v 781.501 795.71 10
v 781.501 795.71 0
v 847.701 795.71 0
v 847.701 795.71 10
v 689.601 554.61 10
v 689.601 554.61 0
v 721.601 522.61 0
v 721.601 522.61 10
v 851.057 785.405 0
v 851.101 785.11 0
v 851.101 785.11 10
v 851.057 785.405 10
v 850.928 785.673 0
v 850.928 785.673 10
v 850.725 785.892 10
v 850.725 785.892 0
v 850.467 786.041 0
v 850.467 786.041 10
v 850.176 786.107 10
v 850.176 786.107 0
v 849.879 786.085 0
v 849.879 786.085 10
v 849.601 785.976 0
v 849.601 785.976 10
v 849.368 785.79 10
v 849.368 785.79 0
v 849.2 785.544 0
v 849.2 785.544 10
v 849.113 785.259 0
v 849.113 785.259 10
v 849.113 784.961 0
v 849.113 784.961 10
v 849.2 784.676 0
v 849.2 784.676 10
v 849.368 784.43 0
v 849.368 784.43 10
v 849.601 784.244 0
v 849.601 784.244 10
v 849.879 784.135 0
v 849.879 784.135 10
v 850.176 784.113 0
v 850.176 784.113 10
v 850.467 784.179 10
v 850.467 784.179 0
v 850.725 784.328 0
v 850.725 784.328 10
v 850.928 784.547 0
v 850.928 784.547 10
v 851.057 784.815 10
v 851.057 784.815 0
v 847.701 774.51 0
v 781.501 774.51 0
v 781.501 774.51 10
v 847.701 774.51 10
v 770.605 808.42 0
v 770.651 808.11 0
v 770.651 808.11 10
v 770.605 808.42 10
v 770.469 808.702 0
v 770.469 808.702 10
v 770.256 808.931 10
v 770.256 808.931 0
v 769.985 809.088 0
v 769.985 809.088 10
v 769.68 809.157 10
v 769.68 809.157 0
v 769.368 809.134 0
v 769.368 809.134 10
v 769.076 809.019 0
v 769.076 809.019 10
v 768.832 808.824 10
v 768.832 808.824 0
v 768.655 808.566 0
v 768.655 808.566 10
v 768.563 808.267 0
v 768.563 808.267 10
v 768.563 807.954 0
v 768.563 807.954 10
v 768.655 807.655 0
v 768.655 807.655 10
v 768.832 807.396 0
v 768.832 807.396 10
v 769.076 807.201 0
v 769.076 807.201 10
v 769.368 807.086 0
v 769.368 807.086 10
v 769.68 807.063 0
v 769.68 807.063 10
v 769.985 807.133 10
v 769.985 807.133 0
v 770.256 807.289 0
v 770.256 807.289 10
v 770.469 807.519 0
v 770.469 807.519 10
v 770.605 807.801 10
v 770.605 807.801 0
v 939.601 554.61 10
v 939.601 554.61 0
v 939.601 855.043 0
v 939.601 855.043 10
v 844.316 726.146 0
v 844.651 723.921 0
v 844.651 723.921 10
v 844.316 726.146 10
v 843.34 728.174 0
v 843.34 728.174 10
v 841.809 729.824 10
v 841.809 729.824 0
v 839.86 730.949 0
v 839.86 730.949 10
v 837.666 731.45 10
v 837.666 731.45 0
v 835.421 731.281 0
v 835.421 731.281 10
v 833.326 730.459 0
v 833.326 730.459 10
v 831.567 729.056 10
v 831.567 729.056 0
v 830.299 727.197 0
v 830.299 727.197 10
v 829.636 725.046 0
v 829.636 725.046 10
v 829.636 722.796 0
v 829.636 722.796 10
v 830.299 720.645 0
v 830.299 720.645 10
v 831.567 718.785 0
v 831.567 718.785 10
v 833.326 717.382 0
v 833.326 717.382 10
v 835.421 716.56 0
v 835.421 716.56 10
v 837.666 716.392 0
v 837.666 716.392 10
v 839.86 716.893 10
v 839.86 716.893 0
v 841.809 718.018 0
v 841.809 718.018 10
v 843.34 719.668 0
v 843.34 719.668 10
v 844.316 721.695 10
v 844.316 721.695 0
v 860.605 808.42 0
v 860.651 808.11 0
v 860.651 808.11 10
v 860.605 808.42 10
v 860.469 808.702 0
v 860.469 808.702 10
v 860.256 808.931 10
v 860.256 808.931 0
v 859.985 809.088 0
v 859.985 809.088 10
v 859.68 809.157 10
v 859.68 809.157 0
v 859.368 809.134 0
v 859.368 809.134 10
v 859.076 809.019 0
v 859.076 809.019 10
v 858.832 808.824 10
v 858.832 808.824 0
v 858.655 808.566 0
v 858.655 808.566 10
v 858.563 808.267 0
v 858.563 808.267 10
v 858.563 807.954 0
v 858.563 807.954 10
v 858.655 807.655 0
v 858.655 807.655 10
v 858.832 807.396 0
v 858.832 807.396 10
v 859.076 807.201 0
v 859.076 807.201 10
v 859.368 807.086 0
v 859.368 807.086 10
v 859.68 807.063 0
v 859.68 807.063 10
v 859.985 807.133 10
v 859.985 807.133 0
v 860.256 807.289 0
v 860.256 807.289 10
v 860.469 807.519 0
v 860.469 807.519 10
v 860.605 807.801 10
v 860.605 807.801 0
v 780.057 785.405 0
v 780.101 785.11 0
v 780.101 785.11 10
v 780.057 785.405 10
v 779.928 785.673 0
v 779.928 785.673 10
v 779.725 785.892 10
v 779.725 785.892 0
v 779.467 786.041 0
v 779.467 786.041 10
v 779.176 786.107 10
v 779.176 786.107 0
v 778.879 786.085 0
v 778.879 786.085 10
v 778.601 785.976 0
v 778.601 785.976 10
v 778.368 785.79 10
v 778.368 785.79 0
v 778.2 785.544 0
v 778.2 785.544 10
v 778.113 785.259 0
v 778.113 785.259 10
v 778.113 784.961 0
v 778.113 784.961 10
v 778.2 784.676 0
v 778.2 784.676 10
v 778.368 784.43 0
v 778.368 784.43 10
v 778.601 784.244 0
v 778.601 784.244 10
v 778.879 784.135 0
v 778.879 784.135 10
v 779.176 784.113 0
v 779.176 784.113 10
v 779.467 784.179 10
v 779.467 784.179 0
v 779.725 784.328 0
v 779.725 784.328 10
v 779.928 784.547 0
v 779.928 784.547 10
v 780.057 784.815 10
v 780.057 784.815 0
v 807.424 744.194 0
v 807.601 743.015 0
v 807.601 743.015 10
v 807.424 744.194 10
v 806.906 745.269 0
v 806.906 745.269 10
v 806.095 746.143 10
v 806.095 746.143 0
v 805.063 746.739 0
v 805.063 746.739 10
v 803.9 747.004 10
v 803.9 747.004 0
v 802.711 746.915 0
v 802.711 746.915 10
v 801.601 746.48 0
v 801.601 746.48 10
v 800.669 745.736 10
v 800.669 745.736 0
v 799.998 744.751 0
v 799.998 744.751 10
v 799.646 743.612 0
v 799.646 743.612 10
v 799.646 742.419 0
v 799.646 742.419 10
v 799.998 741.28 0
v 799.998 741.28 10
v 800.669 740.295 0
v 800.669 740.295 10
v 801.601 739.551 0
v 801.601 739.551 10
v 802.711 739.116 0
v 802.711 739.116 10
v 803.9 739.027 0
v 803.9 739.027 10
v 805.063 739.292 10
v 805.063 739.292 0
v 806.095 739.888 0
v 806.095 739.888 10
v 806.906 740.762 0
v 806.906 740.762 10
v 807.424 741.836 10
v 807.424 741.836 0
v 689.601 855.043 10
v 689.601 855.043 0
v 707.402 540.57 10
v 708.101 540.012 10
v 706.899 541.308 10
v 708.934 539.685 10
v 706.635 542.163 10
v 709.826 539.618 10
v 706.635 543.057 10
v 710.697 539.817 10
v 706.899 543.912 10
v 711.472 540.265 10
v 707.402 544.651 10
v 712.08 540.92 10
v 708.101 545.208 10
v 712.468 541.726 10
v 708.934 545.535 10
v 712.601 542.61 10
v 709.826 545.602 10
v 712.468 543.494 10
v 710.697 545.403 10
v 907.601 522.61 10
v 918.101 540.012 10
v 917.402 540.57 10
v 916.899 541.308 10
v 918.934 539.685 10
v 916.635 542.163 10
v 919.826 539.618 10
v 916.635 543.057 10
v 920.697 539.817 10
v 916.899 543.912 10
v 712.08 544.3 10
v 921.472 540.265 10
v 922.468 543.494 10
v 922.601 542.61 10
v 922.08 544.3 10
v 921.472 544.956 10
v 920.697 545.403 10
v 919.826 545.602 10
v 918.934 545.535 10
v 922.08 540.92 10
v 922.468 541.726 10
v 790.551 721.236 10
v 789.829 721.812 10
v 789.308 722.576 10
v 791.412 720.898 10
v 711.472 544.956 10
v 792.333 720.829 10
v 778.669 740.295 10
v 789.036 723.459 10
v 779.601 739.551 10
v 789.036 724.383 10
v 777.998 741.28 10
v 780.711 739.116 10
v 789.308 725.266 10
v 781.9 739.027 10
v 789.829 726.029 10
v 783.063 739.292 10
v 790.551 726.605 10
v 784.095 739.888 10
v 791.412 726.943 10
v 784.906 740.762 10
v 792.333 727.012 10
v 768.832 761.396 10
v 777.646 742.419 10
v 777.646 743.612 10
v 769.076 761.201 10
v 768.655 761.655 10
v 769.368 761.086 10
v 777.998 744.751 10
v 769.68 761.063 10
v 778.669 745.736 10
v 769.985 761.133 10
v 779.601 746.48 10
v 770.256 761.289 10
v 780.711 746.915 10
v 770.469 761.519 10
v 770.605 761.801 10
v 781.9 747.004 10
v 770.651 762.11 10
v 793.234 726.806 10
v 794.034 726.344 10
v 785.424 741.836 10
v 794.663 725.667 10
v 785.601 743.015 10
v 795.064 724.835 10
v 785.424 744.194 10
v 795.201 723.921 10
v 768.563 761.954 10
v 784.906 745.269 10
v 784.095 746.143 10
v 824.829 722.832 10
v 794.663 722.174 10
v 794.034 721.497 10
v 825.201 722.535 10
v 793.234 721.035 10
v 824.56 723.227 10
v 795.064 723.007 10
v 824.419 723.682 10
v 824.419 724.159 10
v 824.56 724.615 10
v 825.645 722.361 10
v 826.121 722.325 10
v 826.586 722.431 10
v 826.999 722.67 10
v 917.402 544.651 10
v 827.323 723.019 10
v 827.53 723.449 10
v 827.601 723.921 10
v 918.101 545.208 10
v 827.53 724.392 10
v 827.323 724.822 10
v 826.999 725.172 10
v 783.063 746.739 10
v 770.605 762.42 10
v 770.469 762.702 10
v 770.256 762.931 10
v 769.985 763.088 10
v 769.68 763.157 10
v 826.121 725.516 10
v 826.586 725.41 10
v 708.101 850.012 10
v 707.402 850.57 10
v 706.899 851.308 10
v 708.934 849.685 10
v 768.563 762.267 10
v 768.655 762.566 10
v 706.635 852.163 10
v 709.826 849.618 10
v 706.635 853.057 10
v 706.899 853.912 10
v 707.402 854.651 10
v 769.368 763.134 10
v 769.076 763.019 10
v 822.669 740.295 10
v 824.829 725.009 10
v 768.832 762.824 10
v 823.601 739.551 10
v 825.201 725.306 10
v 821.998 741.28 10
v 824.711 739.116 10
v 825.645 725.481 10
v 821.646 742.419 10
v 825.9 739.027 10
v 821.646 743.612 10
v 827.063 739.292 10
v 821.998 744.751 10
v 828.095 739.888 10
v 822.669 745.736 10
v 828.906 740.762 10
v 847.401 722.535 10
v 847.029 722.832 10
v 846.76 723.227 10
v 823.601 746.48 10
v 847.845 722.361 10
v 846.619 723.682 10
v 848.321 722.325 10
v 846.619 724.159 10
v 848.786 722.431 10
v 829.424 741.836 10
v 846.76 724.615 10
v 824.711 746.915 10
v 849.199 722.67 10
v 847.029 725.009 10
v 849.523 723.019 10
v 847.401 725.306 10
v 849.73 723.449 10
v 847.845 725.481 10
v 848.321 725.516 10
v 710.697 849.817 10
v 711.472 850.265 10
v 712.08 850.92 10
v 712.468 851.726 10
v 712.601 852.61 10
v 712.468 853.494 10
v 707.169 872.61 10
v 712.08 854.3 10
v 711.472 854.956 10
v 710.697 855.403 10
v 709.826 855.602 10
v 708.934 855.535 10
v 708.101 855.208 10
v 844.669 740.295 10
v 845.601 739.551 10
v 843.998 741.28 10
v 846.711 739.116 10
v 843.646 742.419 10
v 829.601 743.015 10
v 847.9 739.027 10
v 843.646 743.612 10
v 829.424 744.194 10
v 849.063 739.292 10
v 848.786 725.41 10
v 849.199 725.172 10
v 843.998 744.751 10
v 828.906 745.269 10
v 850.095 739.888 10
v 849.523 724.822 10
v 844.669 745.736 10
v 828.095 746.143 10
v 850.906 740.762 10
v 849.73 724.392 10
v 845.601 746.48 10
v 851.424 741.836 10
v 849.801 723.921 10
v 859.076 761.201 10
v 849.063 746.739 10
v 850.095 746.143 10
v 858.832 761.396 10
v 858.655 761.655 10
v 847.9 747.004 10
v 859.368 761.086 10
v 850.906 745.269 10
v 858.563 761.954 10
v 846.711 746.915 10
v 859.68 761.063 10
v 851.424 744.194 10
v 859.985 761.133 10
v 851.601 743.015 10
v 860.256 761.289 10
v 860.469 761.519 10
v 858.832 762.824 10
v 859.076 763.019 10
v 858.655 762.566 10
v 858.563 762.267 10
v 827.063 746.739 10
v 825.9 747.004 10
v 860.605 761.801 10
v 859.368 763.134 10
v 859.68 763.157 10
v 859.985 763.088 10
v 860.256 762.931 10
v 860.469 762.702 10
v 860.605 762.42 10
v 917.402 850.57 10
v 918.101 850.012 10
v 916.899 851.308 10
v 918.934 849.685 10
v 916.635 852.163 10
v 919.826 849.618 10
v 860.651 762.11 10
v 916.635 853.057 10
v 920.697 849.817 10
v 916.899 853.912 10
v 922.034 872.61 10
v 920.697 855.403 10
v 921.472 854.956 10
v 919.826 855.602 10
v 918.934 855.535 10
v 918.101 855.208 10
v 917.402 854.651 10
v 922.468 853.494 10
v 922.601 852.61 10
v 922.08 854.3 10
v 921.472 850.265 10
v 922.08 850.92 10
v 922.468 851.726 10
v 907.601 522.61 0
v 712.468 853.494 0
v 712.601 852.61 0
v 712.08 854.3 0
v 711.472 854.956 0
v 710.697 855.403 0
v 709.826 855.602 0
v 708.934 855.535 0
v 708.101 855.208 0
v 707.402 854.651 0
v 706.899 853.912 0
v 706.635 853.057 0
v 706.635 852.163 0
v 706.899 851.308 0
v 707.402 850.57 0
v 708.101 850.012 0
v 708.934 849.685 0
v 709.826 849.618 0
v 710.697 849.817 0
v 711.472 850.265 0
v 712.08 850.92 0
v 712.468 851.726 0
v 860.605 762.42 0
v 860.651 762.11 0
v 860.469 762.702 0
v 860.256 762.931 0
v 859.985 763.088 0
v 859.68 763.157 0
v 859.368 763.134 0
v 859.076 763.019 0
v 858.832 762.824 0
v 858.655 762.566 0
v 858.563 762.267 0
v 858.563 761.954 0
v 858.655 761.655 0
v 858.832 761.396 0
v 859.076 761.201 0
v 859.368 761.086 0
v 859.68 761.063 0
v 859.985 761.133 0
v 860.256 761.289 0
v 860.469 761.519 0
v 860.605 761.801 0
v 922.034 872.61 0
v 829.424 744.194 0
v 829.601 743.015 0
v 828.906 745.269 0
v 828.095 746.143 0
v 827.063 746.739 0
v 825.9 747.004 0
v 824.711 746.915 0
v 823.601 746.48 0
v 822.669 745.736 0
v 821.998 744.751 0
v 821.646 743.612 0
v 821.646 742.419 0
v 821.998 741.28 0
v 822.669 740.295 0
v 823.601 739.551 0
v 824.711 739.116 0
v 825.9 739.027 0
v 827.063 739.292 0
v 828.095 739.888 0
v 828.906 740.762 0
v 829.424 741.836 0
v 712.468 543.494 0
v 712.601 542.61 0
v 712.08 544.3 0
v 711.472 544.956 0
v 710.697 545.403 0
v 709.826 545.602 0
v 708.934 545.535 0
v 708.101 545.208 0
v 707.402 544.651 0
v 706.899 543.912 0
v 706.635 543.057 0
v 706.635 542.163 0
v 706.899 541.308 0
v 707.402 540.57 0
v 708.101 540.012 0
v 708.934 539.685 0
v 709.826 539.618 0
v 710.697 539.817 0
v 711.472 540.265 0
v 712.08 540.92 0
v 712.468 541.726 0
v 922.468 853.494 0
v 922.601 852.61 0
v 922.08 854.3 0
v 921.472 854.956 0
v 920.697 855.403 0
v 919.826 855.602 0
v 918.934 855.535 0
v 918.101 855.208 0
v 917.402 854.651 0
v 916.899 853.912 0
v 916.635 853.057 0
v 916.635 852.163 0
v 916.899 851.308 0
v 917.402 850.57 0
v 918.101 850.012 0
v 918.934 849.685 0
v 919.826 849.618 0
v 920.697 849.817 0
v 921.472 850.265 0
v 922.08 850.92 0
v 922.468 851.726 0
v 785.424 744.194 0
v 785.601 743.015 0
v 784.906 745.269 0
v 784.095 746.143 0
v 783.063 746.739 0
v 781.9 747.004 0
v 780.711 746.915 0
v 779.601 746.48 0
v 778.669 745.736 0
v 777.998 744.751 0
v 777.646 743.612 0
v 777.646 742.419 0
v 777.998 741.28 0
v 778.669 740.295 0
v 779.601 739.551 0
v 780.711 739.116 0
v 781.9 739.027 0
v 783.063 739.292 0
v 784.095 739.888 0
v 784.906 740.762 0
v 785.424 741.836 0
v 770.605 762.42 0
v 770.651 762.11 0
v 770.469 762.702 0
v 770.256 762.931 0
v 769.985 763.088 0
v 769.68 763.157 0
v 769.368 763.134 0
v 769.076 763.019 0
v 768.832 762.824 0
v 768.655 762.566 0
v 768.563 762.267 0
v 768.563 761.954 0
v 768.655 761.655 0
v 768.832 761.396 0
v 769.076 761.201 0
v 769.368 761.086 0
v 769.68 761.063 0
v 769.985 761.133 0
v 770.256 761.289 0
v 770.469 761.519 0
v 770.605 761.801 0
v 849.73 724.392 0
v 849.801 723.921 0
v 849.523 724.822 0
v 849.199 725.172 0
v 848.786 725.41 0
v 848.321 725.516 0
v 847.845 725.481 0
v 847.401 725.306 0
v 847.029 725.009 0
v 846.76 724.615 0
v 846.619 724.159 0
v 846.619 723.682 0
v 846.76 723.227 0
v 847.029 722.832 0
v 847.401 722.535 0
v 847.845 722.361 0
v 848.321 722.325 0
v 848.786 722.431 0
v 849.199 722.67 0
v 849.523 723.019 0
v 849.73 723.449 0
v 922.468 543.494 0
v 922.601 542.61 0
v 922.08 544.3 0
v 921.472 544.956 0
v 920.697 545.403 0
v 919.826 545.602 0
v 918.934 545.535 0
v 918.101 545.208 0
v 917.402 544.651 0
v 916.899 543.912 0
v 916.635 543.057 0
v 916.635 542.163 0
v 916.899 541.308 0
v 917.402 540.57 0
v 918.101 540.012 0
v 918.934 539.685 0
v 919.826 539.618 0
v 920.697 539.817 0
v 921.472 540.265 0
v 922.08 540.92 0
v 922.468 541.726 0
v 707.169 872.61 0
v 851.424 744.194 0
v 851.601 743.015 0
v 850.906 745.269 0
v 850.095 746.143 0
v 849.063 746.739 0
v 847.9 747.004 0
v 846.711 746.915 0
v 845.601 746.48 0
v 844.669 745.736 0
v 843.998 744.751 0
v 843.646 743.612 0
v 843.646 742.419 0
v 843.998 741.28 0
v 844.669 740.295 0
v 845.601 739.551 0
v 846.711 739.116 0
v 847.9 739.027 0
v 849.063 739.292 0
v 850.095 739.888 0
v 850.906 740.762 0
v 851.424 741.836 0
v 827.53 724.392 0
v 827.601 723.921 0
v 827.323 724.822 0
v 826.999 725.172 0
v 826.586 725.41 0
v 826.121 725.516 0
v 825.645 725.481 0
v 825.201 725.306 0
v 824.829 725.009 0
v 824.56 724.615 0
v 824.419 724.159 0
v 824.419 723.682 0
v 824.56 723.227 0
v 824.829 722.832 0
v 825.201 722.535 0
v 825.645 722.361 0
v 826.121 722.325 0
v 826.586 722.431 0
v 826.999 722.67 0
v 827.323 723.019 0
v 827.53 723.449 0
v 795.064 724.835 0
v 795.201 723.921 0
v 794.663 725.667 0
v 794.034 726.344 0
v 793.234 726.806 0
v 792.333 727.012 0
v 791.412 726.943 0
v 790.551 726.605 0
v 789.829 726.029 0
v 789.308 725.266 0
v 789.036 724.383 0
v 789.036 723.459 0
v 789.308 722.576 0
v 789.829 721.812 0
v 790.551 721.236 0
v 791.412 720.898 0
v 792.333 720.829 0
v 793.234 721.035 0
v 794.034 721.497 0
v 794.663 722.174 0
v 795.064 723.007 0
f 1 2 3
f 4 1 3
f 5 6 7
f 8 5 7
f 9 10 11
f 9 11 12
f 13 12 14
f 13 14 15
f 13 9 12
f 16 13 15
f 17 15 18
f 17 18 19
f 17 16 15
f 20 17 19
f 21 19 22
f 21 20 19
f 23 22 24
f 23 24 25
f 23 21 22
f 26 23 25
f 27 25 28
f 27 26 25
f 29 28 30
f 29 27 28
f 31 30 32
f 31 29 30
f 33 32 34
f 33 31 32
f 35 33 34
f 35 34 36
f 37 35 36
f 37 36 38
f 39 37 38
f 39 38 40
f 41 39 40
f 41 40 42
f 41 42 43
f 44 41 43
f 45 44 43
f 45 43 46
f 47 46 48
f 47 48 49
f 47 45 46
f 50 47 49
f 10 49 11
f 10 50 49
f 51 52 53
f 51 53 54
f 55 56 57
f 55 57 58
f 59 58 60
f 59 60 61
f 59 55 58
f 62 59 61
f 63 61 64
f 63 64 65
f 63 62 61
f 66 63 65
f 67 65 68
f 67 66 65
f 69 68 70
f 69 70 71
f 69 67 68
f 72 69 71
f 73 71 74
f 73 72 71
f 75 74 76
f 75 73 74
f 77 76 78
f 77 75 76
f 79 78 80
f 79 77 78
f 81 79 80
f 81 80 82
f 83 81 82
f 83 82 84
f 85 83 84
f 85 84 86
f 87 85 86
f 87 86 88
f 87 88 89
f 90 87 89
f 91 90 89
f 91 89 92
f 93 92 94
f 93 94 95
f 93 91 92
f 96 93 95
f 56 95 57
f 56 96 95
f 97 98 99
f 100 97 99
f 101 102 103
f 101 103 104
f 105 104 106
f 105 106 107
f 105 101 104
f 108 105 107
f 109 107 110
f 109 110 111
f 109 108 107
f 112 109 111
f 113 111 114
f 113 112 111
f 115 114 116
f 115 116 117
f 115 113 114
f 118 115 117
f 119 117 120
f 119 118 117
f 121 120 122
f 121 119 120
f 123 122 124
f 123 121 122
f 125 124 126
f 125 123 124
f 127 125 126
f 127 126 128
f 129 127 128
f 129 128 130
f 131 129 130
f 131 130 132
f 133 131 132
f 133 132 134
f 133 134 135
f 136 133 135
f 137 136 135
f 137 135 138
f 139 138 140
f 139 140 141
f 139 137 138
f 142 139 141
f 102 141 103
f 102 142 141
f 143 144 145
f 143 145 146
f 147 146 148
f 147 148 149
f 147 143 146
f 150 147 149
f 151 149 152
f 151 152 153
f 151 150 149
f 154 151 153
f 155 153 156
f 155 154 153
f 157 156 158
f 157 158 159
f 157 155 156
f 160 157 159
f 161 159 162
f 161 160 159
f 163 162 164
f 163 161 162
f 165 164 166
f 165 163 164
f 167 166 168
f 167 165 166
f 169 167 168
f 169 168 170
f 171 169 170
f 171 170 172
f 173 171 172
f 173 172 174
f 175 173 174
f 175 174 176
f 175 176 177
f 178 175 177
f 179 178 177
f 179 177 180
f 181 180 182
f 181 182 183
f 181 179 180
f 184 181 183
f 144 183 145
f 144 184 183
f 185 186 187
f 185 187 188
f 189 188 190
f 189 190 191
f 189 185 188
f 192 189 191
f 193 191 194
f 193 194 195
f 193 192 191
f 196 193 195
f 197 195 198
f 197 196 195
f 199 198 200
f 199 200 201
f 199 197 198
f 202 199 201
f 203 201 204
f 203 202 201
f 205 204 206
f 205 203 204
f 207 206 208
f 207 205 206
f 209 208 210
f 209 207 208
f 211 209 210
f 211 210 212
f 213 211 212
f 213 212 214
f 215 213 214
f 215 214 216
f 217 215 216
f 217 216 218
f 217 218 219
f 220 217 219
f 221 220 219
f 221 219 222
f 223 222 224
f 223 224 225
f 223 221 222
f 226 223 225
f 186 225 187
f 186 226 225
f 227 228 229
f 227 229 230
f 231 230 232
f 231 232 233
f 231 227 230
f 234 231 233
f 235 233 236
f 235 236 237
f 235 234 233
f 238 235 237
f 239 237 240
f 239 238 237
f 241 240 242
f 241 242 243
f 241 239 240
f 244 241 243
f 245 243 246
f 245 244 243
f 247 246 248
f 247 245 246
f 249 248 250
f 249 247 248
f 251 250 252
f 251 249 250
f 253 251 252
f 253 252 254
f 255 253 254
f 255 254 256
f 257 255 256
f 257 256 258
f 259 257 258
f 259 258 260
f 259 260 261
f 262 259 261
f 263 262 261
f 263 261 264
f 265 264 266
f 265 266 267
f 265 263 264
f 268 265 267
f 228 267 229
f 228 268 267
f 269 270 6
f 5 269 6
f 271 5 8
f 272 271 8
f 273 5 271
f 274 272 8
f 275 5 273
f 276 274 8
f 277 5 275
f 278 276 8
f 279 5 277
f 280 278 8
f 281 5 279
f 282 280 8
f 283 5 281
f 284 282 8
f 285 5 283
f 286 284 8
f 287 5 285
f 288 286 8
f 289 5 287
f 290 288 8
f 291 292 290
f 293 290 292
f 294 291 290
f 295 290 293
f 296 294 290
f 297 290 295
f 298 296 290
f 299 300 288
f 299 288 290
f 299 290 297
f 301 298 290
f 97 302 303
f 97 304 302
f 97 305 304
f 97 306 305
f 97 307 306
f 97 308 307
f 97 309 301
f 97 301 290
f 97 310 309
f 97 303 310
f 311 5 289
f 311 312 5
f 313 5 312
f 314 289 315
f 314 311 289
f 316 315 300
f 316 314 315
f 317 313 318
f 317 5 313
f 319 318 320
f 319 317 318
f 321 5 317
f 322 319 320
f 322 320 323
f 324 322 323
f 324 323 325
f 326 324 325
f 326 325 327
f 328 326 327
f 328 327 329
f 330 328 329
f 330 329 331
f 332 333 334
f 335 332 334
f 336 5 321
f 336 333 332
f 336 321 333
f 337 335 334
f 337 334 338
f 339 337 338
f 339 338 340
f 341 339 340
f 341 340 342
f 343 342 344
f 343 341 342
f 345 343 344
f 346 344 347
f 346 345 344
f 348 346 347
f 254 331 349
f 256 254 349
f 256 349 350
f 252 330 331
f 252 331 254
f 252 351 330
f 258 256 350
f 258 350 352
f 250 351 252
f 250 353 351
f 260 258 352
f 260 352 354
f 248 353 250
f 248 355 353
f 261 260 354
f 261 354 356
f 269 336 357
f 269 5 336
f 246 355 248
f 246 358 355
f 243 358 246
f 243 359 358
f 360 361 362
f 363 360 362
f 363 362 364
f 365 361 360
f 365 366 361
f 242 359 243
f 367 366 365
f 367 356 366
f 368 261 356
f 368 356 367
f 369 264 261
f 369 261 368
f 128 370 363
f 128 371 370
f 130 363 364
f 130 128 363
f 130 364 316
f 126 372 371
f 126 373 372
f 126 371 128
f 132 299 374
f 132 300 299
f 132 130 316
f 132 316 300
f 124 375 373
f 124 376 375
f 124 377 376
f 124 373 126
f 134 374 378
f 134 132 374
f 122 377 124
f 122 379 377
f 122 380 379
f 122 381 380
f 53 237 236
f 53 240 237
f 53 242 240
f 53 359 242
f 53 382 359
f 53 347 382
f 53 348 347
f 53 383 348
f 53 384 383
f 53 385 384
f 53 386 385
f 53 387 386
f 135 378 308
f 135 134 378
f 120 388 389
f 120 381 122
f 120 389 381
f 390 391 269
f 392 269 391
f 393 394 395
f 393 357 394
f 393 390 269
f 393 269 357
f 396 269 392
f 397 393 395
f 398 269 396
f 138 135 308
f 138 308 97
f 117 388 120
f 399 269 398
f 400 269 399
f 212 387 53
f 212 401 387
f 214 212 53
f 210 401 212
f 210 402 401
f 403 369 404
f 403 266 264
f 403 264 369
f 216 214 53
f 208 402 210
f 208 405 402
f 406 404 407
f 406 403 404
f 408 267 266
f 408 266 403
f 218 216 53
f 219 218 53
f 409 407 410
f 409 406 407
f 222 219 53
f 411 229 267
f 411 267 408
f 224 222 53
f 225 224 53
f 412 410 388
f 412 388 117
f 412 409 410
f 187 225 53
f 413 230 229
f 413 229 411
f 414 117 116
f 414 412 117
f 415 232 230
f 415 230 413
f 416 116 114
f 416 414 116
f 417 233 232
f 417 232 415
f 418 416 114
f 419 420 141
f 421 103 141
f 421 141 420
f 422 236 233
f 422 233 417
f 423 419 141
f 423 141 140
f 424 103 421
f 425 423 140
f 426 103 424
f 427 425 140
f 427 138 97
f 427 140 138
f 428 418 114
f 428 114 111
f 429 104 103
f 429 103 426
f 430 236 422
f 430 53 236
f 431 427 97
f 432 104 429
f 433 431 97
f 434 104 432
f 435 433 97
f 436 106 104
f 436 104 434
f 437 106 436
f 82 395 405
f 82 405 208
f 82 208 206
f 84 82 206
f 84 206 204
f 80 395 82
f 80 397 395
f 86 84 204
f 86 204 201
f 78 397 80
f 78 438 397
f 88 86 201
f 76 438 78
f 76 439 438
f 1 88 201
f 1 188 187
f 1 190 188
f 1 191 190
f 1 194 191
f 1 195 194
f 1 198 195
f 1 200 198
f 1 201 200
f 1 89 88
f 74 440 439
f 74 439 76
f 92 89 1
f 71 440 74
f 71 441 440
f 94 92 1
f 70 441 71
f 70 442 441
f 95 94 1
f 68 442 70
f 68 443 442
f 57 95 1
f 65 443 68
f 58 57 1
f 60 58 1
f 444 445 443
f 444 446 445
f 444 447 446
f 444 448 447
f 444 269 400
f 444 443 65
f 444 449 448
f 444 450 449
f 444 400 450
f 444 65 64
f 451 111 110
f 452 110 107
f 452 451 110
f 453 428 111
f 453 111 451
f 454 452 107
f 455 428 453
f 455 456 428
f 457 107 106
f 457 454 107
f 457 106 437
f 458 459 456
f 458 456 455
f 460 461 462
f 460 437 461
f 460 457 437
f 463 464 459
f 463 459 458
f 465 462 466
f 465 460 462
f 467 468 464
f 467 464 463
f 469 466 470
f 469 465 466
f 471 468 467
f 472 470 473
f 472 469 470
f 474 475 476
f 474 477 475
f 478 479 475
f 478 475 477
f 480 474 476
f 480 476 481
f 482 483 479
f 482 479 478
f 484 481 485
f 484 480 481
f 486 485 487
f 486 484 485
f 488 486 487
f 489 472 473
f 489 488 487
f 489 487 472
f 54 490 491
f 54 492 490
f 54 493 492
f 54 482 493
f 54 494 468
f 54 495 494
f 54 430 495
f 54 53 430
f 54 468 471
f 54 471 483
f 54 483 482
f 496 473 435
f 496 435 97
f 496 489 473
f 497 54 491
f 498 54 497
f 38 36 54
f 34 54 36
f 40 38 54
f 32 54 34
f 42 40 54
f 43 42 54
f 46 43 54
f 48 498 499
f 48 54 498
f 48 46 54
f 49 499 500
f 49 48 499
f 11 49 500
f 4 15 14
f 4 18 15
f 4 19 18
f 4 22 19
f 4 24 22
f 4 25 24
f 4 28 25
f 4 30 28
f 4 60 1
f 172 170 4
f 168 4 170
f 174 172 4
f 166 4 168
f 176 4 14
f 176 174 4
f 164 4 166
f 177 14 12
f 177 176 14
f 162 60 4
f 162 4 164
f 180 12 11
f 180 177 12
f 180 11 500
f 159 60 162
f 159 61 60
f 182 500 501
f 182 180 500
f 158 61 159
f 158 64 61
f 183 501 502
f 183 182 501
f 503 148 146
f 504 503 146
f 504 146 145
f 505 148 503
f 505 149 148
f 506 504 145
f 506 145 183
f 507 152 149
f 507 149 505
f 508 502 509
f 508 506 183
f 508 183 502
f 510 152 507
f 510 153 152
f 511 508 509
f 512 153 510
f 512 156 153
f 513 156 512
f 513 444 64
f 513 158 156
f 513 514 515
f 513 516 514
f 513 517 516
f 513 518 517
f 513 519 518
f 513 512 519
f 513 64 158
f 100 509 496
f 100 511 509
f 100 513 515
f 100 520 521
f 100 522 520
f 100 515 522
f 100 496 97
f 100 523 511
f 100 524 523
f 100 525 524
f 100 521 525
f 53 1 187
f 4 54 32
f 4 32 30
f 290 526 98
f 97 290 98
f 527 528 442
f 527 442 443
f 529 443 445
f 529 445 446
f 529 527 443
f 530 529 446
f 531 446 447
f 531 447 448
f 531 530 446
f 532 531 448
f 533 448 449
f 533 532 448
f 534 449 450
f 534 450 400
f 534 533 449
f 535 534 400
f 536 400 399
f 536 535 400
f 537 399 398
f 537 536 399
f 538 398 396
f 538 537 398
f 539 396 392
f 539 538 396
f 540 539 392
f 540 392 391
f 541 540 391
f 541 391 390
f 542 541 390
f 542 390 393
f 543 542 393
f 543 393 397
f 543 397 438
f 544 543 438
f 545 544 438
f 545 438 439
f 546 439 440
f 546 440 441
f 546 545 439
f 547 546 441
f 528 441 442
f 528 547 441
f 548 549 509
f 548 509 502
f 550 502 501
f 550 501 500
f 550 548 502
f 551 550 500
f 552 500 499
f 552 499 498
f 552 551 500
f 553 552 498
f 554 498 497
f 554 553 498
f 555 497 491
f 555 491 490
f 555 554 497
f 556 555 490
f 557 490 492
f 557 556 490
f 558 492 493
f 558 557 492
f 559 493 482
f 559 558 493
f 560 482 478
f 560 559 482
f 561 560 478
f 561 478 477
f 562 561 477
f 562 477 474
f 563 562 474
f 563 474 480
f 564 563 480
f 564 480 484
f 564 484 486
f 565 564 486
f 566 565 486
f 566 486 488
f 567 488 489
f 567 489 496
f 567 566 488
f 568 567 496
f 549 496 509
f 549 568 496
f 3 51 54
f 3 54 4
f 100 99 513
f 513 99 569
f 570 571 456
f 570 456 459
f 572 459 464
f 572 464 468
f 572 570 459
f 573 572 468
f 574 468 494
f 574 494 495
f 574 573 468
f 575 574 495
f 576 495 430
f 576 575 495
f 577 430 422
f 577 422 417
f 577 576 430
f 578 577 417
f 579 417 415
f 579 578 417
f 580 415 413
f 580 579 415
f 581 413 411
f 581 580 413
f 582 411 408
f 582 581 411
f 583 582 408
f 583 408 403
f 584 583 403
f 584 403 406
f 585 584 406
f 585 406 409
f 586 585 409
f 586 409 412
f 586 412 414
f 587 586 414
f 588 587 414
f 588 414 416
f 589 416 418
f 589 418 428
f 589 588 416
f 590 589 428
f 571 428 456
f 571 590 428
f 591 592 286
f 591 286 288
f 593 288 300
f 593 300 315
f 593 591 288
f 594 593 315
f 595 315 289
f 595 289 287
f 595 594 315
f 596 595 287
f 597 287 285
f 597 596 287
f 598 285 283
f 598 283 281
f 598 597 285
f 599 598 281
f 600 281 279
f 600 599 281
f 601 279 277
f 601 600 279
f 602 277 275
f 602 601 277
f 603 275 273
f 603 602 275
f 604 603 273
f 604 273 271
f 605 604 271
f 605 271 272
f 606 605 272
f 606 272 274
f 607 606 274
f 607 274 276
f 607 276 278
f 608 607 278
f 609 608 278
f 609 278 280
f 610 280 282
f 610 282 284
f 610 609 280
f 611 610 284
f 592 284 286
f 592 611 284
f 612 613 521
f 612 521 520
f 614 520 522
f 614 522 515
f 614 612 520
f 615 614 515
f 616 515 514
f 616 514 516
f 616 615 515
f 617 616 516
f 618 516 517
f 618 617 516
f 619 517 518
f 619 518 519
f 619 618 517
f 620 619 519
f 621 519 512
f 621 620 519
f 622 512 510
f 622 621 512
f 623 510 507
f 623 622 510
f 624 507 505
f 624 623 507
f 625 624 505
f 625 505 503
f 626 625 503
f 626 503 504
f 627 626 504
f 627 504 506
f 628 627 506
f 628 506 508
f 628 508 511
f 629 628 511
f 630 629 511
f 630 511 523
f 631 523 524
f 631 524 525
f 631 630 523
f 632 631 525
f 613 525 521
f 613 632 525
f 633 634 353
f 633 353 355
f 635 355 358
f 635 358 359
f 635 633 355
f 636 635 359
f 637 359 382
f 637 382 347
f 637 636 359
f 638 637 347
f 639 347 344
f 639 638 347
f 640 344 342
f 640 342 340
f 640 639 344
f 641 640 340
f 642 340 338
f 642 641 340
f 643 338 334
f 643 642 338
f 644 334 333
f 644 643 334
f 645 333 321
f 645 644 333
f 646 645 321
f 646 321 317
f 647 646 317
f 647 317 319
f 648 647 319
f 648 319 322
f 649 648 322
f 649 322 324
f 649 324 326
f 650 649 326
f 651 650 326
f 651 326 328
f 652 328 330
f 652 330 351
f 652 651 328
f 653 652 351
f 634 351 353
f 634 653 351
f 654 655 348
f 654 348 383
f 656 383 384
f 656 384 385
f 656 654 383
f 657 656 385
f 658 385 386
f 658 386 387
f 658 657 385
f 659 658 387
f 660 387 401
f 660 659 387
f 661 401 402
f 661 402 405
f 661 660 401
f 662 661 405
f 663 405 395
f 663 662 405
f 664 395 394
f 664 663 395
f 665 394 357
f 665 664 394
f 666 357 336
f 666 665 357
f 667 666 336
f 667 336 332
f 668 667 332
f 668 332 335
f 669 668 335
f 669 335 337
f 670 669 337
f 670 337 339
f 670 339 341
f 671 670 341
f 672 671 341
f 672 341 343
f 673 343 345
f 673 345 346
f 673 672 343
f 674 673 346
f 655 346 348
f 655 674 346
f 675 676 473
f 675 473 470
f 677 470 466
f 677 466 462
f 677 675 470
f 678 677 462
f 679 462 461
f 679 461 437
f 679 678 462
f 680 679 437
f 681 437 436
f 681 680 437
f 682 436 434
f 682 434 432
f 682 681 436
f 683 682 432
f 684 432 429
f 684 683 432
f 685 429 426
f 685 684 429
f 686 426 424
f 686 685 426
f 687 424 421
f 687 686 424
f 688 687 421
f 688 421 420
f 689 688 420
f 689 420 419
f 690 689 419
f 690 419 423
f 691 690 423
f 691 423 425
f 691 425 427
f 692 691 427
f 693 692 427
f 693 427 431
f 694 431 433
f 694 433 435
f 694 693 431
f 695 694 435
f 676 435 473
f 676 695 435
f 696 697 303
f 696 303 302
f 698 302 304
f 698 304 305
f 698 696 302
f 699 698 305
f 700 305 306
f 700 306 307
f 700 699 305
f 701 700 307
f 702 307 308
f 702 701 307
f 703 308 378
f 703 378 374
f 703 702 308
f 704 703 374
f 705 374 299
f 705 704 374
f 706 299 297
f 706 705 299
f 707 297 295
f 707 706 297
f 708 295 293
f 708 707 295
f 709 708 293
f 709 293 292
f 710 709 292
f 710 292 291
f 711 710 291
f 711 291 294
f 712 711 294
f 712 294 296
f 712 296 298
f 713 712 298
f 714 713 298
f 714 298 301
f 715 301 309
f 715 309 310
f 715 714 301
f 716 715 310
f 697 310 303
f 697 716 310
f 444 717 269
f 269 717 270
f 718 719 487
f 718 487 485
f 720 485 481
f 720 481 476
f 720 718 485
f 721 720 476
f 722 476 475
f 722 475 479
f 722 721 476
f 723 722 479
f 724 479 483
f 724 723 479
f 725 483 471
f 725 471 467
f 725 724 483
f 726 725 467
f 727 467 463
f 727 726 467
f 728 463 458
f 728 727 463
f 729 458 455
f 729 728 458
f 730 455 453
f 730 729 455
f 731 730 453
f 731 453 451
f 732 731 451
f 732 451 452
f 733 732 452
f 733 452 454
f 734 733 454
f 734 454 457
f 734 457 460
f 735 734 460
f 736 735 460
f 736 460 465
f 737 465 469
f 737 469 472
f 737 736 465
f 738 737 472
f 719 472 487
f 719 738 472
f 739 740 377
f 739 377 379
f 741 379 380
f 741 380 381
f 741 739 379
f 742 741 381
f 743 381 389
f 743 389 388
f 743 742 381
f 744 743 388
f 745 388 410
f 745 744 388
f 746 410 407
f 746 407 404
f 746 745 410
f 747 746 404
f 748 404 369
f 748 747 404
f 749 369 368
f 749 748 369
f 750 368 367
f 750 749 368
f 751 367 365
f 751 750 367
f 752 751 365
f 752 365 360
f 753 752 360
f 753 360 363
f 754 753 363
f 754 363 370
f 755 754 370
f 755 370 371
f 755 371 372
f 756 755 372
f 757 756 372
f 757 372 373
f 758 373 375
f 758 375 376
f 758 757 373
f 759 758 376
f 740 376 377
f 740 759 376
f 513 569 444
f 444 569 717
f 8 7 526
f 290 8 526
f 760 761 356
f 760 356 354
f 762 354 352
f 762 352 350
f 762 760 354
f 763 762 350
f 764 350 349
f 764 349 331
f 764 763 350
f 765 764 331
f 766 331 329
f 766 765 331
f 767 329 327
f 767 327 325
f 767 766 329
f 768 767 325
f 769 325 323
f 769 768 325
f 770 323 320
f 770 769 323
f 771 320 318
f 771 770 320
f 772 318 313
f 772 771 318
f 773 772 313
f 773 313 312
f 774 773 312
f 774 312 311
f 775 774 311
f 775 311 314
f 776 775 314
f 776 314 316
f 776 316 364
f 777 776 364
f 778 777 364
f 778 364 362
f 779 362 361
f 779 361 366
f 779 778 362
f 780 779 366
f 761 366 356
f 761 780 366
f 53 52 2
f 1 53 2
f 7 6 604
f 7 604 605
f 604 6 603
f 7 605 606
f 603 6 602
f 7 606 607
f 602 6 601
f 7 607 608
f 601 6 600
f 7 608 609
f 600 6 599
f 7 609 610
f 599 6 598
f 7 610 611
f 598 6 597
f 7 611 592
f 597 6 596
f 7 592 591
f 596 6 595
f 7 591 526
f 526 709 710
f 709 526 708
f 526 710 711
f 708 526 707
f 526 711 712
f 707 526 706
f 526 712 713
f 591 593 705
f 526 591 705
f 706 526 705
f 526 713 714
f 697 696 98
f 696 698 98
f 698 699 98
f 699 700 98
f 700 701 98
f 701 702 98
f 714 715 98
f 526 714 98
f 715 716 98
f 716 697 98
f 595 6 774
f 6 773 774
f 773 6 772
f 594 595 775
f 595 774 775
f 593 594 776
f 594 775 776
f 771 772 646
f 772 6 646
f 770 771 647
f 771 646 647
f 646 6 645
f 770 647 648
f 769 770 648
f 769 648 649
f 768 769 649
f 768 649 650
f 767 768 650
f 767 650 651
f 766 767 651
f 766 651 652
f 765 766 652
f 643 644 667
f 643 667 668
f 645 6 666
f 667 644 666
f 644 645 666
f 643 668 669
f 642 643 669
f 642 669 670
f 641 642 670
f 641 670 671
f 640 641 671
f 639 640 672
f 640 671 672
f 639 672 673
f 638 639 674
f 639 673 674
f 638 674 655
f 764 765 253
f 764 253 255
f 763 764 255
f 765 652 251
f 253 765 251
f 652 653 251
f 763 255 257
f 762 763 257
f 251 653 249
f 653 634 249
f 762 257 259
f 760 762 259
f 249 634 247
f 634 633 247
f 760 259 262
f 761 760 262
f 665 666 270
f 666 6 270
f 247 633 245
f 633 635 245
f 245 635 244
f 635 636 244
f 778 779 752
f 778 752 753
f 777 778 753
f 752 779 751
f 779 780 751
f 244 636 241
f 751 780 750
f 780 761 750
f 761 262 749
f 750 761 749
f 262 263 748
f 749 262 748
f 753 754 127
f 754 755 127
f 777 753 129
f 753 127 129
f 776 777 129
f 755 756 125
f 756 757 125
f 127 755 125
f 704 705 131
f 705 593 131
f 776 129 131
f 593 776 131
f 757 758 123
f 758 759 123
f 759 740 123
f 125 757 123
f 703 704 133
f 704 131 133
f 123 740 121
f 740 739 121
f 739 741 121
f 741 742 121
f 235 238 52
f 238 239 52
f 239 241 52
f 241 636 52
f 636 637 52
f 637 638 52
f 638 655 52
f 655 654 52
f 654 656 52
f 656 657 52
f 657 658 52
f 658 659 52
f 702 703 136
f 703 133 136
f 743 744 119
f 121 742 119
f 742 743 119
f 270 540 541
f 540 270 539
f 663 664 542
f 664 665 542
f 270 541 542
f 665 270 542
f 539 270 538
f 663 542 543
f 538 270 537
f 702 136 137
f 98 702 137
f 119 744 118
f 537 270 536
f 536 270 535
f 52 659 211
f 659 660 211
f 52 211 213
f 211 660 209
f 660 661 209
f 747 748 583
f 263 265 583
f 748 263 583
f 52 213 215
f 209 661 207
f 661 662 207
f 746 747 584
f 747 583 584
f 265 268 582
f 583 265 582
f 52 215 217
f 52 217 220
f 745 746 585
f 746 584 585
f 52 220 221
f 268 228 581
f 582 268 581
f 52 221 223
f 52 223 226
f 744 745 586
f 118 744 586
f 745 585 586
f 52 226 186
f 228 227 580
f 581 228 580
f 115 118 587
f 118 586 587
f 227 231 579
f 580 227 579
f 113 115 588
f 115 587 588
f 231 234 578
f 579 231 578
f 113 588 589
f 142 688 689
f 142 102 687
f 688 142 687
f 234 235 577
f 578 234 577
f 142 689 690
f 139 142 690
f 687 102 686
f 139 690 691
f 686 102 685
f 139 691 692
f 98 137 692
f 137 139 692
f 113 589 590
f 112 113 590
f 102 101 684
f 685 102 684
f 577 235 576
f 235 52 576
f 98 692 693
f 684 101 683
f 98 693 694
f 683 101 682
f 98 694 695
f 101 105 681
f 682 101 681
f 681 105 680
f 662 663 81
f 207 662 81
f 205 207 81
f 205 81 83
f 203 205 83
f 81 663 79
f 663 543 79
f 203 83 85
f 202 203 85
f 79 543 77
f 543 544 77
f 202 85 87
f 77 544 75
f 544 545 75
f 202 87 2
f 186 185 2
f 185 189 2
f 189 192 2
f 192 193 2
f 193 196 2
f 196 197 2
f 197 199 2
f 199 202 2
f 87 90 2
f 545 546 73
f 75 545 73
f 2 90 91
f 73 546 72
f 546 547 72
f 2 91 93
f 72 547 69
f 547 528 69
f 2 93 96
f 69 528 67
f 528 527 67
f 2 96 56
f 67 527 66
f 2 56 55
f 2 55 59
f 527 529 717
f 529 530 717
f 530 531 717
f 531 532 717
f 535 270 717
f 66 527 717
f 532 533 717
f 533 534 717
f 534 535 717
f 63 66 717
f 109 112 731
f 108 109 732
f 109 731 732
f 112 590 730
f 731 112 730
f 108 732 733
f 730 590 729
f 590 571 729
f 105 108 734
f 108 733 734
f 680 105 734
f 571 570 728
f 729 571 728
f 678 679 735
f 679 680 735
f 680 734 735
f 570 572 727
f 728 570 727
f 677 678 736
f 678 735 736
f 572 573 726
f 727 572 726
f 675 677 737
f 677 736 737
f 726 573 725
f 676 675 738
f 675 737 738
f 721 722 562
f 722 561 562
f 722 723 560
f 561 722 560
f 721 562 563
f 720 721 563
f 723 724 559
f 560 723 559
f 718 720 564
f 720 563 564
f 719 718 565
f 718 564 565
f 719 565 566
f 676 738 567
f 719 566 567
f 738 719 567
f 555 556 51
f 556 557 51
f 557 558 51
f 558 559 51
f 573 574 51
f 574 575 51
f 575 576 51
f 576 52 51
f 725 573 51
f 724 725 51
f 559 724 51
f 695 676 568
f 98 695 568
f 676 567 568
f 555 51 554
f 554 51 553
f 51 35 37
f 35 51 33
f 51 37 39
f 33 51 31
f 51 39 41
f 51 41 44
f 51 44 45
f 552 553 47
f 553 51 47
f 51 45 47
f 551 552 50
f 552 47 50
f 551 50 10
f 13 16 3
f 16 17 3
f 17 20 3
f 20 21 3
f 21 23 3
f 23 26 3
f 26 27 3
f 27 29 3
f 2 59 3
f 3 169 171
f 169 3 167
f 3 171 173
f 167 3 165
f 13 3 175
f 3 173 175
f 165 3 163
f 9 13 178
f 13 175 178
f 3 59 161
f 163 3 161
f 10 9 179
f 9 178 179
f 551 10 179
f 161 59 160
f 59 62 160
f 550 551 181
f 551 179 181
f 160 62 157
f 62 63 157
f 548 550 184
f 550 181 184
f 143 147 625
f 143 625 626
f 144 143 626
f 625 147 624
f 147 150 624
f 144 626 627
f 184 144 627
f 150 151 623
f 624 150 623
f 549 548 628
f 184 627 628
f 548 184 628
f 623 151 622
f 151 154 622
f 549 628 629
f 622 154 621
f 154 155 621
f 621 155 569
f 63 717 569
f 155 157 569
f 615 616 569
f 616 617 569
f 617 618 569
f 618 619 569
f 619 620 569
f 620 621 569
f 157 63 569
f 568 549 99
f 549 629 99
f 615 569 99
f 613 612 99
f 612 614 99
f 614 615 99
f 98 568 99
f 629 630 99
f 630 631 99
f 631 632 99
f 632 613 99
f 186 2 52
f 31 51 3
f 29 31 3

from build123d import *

# Parameters (mm, degrees)
ESQUISSE1_R        = 3
ESQUISSE1_R_2      = 1.05
ESQUISSE1_R_3      = 1
ESQUISSE1_R_4      = 7.55
ESQUISSE1_R_5      = 4
ESQUISSE1_R_6      = 1.6
ESQUISSE1_R_7      = 3.1
ESQUISSE1_W        = 66.2
ESQUISSE1_H        = 21.2
BOSS_EXTRU_1_DEPTH = 10


with BuildPart() as part:
    # Esquisse1 → Boss.-Extru.1 (new body)
    with BuildSketch(Plane.XY):
        Polygon((907.601426779, 522.610093658), (939.601426779, 554.610093658), (939.601426779, 855.042708993), (922.034042113, 872.610093658), (707.168811445, 872.610093658), (689.601426779, 855.042708993), (689.601426779, 554.610093658), (721.601426779, 522.610093658), align=None)
        with Locations((709.601426779, 542.610093658)):
            Circle(ESQUISSE1_R, mode=Mode.SUBTRACT)
        with Locations((709.601426779, 852.610093658)):
            Circle(ESQUISSE1_R, mode=Mode.SUBTRACT)
        with Locations((919.601426779, 852.610093658)):
            Circle(ESQUISSE1_R, mode=Mode.SUBTRACT)
        with Locations((919.601426779, 542.610093658)):
            Circle(ESQUISSE1_R, mode=Mode.SUBTRACT)
        with Locations((859.601426779, 808.110093658)):
            Circle(ESQUISSE1_R_2, mode=Mode.SUBTRACT)
        with Locations((769.601426779, 808.110093658)):
            Circle(ESQUISSE1_R_2, mode=Mode.SUBTRACT)
        with Locations((769.601426779, 762.110093658)):
            Circle(ESQUISSE1_R_2, mode=Mode.SUBTRACT)
        with Locations((859.601426779, 762.110093658)):
            Circle(ESQUISSE1_R_2, mode=Mode.SUBTRACT)
        with Locations((850.101426779, 785.110093658)):
            Circle(ESQUISSE1_R_3, mode=Mode.SUBTRACT)
        with Locations((779.101426779, 785.110093658)):
            Circle(ESQUISSE1_R_3, mode=Mode.SUBTRACT)
        with Locations((837.101426779, 723.920773658)):
            Circle(ESQUISSE1_R_4, mode=Mode.SUBTRACT)
        with Locations((847.601426779, 743.015433658)):
            Circle(ESQUISSE1_R_5, mode=Mode.SUBTRACT)
        with Locations((848.201426779, 723.920773658)):
            Circle(ESQUISSE1_R_6, mode=Mode.SUBTRACT)
        with Locations((826.001426779, 723.920773658)):
            Circle(ESQUISSE1_R_6, mode=Mode.SUBTRACT)
        with Locations((825.601426779, 743.015433658)):
            Circle(ESQUISSE1_R_5, mode=Mode.SUBTRACT)
        with Locations((803.601426779, 743.015433658)):
            Circle(ESQUISSE1_R_5, mode=Mode.SUBTRACT)
        with Locations((781.601426779, 743.015433658)):
            Circle(ESQUISSE1_R_5, mode=Mode.SUBTRACT)
        with Locations((792.101426779, 723.920773658)):
            Circle(ESQUISSE1_R_7, mode=Mode.SUBTRACT)
        with Locations((814.601426779, 785.110093658)):
            Rectangle(ESQUISSE1_W, ESQUISSE1_H, mode=Mode.SUBTRACT)
    extrude(amount=BOSS_EXTRU_1_DEPTH)


solid = part.part
